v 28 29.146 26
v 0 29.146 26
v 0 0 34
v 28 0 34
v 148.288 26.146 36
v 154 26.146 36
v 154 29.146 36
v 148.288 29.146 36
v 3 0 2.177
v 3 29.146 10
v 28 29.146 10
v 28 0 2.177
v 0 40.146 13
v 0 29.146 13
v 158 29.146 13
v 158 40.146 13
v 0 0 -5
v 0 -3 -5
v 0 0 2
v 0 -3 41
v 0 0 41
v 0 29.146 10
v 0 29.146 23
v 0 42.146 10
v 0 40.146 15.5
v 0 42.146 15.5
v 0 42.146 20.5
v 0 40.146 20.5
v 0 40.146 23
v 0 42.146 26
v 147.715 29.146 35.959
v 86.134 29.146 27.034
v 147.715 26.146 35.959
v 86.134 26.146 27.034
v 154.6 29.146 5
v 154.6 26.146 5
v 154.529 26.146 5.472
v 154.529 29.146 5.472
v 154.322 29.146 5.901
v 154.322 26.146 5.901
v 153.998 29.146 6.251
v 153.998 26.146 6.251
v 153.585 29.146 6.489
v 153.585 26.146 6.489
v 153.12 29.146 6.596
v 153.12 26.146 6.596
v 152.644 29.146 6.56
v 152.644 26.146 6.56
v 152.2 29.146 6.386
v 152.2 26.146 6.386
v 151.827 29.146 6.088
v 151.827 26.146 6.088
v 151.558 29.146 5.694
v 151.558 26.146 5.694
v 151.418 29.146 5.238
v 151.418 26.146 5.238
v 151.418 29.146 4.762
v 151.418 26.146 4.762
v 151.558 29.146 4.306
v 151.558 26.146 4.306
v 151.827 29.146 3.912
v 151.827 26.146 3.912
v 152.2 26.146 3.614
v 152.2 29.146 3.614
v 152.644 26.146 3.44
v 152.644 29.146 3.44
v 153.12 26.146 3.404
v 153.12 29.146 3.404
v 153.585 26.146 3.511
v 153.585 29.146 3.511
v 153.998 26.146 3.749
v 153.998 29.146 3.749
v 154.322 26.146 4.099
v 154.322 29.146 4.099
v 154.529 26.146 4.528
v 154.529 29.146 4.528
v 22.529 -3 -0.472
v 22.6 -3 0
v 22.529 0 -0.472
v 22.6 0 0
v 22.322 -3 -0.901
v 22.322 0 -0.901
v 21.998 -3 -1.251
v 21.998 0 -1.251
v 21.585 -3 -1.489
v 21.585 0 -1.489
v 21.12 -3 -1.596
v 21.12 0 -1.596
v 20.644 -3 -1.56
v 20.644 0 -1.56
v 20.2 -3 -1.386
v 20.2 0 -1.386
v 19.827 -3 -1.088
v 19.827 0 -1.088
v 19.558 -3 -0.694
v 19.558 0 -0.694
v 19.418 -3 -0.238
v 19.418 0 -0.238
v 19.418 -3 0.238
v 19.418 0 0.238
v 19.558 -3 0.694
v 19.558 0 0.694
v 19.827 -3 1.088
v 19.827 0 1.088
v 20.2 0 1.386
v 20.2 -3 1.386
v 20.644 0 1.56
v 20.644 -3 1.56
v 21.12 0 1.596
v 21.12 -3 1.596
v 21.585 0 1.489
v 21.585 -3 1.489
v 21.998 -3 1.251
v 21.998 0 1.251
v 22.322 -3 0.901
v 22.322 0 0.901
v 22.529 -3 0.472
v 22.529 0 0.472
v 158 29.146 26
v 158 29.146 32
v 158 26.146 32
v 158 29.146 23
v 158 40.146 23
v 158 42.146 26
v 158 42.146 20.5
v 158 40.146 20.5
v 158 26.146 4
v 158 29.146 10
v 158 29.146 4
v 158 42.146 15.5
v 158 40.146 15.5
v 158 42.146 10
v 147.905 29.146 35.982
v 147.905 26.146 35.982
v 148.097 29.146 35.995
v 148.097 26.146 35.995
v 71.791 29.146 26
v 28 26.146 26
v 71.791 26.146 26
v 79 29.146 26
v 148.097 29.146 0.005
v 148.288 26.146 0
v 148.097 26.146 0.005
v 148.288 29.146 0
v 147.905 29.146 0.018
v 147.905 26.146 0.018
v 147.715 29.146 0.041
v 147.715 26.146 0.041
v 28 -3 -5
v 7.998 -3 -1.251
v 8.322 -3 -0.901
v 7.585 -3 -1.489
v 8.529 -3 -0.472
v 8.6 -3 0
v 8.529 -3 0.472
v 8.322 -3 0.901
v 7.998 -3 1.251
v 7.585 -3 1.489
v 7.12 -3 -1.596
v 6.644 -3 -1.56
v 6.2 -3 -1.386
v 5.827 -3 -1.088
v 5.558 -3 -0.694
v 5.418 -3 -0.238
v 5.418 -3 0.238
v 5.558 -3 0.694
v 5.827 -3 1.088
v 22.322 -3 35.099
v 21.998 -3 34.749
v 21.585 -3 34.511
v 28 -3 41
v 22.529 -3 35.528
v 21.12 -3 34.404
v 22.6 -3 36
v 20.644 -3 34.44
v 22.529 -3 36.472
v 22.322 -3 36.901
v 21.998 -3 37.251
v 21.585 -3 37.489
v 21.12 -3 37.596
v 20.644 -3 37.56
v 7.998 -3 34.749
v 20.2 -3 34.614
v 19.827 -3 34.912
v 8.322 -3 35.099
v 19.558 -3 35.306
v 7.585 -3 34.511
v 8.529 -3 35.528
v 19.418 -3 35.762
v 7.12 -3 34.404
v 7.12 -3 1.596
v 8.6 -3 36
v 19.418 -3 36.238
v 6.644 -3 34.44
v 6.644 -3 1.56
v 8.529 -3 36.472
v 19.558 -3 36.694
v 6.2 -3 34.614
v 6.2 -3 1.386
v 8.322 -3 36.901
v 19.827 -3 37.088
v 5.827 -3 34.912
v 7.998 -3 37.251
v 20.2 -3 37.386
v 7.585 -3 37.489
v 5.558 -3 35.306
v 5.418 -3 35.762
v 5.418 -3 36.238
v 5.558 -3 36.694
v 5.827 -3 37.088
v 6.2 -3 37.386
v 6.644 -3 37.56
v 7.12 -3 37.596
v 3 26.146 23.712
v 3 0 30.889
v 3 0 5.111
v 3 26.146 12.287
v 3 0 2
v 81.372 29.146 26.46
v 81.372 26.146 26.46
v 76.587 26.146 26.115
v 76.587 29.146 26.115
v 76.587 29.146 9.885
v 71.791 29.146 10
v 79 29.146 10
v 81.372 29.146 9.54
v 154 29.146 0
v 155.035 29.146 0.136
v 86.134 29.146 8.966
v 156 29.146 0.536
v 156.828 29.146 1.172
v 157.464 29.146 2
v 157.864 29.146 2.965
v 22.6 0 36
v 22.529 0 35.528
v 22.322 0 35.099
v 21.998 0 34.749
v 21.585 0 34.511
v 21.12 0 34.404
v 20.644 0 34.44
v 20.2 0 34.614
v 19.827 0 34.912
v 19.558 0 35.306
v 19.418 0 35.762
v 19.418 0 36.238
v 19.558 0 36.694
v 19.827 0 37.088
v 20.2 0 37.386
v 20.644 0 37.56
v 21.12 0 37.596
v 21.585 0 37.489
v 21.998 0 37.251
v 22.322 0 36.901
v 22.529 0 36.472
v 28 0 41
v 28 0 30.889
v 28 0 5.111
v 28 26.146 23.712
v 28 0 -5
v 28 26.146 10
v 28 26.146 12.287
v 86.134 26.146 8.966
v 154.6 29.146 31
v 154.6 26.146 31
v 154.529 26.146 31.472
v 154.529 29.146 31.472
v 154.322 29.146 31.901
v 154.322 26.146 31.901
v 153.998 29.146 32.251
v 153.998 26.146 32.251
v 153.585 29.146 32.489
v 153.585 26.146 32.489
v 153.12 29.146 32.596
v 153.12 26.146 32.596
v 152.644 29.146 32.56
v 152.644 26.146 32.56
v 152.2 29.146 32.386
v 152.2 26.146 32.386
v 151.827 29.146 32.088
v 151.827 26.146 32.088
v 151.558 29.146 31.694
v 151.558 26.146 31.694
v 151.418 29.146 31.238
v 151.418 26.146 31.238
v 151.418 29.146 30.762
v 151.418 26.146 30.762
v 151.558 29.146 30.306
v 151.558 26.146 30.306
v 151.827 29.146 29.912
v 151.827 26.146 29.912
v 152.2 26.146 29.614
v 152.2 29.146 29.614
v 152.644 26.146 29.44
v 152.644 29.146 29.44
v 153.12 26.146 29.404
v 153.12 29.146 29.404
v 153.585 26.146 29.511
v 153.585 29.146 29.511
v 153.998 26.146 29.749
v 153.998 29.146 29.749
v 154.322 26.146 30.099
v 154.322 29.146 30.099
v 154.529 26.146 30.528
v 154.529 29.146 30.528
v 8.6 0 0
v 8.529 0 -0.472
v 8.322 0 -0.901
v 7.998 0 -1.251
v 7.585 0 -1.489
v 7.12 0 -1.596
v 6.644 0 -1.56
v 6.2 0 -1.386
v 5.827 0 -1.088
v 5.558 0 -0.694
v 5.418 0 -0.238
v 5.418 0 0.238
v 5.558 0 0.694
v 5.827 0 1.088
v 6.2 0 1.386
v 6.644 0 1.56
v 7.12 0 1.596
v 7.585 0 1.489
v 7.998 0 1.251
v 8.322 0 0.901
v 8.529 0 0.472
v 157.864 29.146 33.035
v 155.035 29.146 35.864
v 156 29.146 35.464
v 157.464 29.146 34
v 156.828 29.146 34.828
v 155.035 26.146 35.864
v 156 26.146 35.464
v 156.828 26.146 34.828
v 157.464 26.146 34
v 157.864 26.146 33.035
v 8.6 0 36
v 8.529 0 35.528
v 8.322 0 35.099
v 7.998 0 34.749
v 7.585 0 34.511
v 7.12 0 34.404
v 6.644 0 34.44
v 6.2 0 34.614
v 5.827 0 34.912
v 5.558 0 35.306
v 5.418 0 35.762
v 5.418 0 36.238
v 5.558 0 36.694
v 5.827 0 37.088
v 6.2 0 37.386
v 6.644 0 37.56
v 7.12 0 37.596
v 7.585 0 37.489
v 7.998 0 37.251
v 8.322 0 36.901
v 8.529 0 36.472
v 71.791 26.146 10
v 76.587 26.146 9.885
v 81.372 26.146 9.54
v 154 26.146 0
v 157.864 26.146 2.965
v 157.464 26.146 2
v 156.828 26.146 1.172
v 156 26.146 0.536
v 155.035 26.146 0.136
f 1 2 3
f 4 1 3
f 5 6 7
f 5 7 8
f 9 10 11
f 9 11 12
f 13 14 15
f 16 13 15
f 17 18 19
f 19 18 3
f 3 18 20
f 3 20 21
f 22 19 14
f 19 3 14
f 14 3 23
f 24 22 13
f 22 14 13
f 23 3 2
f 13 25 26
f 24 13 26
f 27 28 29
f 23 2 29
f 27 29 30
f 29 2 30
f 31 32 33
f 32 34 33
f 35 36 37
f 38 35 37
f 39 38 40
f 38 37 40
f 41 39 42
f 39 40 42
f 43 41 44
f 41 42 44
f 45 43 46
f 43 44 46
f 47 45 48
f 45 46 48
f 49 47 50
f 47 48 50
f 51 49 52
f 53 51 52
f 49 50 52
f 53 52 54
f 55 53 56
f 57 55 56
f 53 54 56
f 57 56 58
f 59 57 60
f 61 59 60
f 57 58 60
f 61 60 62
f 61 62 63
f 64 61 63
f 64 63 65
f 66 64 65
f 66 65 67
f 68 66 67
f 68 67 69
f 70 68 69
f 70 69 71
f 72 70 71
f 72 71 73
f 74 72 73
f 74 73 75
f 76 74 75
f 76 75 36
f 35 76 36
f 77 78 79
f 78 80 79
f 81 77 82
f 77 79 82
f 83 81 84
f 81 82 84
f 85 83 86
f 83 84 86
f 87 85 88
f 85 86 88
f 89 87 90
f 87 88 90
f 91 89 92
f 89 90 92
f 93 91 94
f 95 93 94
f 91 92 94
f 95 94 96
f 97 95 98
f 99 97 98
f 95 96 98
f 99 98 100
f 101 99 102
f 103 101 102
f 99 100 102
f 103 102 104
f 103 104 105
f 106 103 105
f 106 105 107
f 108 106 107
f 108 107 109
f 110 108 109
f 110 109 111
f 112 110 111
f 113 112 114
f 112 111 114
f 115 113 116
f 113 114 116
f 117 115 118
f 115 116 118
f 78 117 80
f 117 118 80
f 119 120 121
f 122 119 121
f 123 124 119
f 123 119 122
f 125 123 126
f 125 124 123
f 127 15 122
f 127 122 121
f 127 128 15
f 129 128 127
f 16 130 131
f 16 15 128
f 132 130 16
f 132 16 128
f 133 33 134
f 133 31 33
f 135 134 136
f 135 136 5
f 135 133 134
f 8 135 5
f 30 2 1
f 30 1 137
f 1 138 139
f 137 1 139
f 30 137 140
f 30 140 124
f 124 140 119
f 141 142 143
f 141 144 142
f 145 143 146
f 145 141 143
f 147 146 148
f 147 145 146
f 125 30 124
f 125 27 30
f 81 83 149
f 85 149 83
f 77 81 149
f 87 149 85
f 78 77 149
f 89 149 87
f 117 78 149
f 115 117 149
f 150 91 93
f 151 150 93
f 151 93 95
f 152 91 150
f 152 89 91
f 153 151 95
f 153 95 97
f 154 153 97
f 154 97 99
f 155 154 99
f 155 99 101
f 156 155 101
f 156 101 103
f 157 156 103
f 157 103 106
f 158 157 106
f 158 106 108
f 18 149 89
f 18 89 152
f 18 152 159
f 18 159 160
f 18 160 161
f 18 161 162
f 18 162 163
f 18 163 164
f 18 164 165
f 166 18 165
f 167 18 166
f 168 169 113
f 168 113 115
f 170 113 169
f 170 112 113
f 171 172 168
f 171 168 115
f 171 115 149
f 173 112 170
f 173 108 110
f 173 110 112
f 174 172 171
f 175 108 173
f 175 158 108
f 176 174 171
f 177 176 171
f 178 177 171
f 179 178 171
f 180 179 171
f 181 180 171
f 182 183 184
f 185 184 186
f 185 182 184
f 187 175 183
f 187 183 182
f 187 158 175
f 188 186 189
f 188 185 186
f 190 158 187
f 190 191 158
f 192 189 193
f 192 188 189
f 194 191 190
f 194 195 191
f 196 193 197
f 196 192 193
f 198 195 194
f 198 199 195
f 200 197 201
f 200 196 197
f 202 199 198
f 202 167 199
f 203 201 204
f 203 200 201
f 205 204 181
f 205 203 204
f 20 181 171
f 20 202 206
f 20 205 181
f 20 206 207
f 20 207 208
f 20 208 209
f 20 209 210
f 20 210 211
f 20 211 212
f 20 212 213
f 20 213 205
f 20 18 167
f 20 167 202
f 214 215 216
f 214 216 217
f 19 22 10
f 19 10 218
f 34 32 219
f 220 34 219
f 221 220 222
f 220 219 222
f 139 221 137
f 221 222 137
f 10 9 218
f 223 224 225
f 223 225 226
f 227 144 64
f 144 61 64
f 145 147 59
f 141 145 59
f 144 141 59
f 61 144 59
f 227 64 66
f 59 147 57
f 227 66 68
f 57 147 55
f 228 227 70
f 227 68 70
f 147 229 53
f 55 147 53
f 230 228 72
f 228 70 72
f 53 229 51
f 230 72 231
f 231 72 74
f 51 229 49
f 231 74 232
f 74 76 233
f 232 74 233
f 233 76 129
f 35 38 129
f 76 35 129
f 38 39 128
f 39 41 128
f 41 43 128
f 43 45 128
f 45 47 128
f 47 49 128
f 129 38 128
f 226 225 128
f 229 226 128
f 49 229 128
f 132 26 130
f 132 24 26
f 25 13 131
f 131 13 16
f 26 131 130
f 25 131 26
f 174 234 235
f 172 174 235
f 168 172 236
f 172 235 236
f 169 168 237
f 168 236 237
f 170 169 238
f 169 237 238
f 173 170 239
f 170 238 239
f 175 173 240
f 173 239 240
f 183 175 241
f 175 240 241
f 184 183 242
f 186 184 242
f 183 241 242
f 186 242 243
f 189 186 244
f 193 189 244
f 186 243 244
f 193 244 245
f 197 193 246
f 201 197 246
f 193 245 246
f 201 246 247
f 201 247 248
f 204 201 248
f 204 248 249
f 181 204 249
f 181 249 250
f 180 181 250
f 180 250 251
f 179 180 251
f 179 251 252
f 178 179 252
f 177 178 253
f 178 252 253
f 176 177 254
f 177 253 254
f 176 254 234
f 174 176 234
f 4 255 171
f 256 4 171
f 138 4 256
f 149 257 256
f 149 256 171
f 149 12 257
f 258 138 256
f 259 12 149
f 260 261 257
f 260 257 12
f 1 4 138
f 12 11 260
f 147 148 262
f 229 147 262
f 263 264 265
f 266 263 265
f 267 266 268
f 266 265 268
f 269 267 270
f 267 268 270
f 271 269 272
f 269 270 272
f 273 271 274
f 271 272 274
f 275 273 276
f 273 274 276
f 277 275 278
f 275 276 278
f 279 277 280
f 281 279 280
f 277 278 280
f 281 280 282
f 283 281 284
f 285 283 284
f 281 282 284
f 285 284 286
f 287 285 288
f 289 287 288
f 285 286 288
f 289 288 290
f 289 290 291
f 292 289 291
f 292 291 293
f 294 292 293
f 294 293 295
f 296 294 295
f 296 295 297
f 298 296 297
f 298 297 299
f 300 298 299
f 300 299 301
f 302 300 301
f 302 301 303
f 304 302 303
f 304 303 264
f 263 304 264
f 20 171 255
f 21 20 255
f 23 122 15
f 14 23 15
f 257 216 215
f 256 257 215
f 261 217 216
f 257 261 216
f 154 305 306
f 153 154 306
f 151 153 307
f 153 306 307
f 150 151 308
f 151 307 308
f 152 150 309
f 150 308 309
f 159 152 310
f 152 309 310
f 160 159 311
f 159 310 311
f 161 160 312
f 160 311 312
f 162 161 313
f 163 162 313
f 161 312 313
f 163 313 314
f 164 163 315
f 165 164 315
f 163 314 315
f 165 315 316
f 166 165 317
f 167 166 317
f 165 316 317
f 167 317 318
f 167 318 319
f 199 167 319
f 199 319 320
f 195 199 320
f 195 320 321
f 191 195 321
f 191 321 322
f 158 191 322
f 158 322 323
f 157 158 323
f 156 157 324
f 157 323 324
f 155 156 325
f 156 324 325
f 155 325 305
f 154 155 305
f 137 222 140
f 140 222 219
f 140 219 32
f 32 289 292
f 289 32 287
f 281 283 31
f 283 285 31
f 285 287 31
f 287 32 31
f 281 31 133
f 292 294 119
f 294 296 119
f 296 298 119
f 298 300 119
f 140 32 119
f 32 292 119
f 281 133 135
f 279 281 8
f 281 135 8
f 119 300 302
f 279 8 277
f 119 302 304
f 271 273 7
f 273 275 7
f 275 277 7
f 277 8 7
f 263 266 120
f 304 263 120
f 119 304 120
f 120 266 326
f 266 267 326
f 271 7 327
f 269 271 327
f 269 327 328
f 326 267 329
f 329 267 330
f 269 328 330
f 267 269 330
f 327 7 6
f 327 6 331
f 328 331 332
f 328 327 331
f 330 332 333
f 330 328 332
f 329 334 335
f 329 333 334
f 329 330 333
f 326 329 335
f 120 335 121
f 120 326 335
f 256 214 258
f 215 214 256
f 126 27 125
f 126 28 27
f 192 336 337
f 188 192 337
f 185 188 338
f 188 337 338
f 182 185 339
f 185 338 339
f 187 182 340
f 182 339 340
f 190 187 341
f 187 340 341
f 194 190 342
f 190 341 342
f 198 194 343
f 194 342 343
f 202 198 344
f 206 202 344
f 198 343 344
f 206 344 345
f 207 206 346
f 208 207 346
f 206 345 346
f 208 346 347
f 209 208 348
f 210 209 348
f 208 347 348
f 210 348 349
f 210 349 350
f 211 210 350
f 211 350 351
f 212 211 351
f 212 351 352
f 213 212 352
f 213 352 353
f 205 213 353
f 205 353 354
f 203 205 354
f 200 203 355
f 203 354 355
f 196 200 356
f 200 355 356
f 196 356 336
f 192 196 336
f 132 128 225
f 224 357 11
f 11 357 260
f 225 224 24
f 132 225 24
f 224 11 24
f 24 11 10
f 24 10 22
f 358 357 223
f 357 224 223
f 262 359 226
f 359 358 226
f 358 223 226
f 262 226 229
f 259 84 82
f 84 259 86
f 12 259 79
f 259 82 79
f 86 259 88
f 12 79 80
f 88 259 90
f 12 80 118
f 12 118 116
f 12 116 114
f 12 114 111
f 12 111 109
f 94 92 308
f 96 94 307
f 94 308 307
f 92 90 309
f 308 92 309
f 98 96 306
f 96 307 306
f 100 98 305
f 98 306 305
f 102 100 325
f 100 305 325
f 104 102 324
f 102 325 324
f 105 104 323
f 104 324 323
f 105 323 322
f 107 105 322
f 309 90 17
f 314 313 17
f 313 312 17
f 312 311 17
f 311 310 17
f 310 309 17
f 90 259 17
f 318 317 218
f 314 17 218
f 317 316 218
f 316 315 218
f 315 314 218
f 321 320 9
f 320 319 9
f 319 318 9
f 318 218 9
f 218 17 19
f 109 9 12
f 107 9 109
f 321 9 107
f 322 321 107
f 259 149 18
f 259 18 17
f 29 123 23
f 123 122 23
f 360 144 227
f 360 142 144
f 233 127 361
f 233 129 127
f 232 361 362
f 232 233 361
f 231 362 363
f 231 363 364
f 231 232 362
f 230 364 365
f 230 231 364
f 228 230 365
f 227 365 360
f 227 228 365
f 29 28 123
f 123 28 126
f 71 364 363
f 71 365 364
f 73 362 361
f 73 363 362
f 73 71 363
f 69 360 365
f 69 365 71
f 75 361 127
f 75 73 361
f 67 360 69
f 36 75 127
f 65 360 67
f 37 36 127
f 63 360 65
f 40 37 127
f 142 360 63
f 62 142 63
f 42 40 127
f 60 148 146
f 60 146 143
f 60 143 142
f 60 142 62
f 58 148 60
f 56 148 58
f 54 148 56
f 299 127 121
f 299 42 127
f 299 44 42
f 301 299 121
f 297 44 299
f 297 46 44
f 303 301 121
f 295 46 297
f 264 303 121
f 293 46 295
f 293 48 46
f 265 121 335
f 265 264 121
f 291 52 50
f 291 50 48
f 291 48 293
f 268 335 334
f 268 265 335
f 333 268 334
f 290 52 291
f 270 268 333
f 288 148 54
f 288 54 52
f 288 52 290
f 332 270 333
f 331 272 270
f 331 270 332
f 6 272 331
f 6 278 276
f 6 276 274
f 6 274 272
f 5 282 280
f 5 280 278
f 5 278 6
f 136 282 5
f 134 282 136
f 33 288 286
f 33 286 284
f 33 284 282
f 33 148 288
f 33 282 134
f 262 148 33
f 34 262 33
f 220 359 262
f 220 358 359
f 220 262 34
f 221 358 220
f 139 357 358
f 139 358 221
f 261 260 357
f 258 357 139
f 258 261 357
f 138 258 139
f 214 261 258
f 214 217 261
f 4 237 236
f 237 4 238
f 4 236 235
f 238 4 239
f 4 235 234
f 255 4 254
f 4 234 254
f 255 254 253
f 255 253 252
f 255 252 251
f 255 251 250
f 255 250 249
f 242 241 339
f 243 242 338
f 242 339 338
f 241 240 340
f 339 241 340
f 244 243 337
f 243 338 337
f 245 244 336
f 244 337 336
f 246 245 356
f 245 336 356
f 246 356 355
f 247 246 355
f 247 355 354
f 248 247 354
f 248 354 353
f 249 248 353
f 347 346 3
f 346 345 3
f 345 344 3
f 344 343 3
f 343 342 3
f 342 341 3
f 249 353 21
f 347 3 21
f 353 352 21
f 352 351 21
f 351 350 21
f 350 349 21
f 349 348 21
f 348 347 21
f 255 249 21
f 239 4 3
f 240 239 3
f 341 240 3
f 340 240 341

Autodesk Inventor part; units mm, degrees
ref_plane "YZ Plane" through (0, 0, 0) normal (1, 0, 0) x (0, 1, 0)
ref_plane "XZ Plane" through (0, 0, 0) normal (0, 1, 0) x (-1, 0, 0)
ref_plane "XY Plane" through (0, 0, 0) normal (0, 0, 1) x (1, 0, 0)
sketch "Эскиз2" plane through (0, 0, 0) normal (1, 0, 0) x (0, 1, 0)
  line L0 (0, 0) -> (-3, 0)
  line L1 (-3, 0) -> (-3, 36)
  line L2 (-3, 36) -> (0, 36)
  line L3 (0, 36) -> (0, 0)
  line L4 (-3, 0) -> (0, 0)
  line L5 (0, 0) -> (0, -5)
  line L6 (0, -5) -> (-3, -5)
  line L7 (-3, -5) -> (-3, 0)
  line L8 (-3, 36) -> (0, 36)
  line L9 (0, 36) -> (0, 41)
  line L10 (0, 41) -> (-3, 41)
  line L11 (-3, 41) -> (-3, 36)
  line L12 (0, 0) -> (0, 36)
  line L13 (0, 36) -> (0, 34)
  line L14 (0, 0) -> (0, 2)
  line L15 (29.146, 18) -> (29.146, 26)
  line L16 (29.146, 26) -> (29.146, 10)
  line L17 (29.146, 10) -> (0, 2)
  line L18 (29.146, 26) -> (0, 34)
  point P0 (19.146, 0)
  dimension "d4" = 3
  dimension "d5" = 36
  dimension "d6" = 5
  dimension "d7" = 5
  dimension "d8" = 19.146
  dimension "d13" = 2
  dimension "d14" = 2
extrude "Выдавливание2" add sketch "Эскиз2" along normal blind 3
sketch "Эскиз3" plane through (3, 0, 0) normal (1, 0, 0) x (0, 0, -1)
  line L0 (5, -3) -> (5, 0) projected
  line L1 (5, 0) -> (-41, 0) projected
  line L2 (5, -3) -> (-41, -3)
  line L3 (-41, -3) -> (-41, 0)
  line L4 (-41, 0) -> (5, 0)
  line L5 (5, 0) -> (5, -3)
  point P0 (0, 0)
  point P1 (-34, 0)
extrude "Выдавливание3" add sketch "Эскиз3" along normal blind 25
sketch "Эскиз5" plane through (0, 0, 2) normal (0, 1, 0) x (1, 0, 0)
  line L0 (0, 7) -> (28, 7) projected
  line L1 (0, 7) -> (0, 2)
  line L2 (0, 7) -> (0, 0) projected
  line L3 (0, 2) -> (28, 2)
  line L4 (28, -39) -> (28, 7) projected
  line L5 (0, 7) -> (0, -39) projected
  line L6 (0, -39) -> (0, -34)
  line L7 (0, -34) -> (28, -34)
  line L8 (28, -34) -> (21, -34)
  line L9 (21, -34) -> (7, -34)
  line L10 (7, -34) -> (7, 2)
  circle A0 centre (7, -34) radius 1.6
  circle A1 centre (21, -34) radius 1.6
  circle A2 centre (7, 2) radius 1.6
  circle A3 centre (21, 2) radius 1.6
  point P0 (0, -32)
  dimension "d17" = 5
  dimension "d18" = 7
  dimension "d19" = 14
  dimension "d20" = 3.2
  dimension "d21" = 3.2
  dimension "d22" = 3.2
  dimension "d23" = 3.2
extrude "Выдавливание4" cut sketch "Эскиз5" against normal blind 25 contours A2 L3 | L3 L10 A2 | A3 L3 | L3 A3 | L3 A2 L10 | A1 L7 | L7 A1 | A0 L10 L7 | L7 A0 | A0 L7 L10
sketch "Эскиз7" plane through (3, 0, 0) normal (1, 0, 0) x (0, 0, -1)
  line L0 (-10, 29.146) -> (-26, 29.146) projected
  line L1 (-26, 29.146) -> (-10, 29.146)
  line L2 (-10, 29.146) -> (-10, 26.146)
  line L3 (-10, 26.146) -> (-26, 26.146)
  line L4 (-26, 26.146) -> (-26, 29.146)
  point P0 (0, 0)
  dimension "d37" = 3
extrude "Выдавливание6" add sketch "Эскиз7" along normal blind 155 and the other way blind 3
sketch "Эскиз8" plane through (0, 29.146, 26) normal (0, 1, 0) x (1, 0, 0)
  line L0 (158, 16) -> (158, 0) projected
  line L1 (0, -15) -> (0, 31) projected
  line L2 (158, 16) -> (0, 16)
  line L3 (0, 16) -> (0, 13)
  line L4 (0, 13) -> (158, 13)
  line L5 (158, 13) -> (158, 16)
  line L6 (0, 0) -> (3, 0) projected
  line L7 (0, 0) -> (158, 0)
  line L8 (158, 0) -> (158, 3)
  line L9 (158, 3) -> (0, 3)
  line L10 (0, 3) -> (0, 0)
  point P0 (0, 26)
  point P1 (158, 3)
  point P2 (0, 3)
  dimension "d38" = 3
  dimension "d39" = 3
extrude "Выдавливание7" add sketch "Эскиз8" along normal blind 11 contours L0 L4 L1 L2 | L0 L7 L6 L1 L9
sketch "Эскиз9" plane through (3, 0, 0) normal (1, 0, 0) x (0, 0, -1)
  line L0 (-26, 29.146) -> (-34, 0) projected
  line L1 (-34, 0) -> (-26, 29.146)
  line L2 (-26, 29.146) -> (-10, 29.146)
  line L3 (-10, 29.146) -> (-2.177, 0)
  line L4 (-2.177, 0) -> (-34, 0)
  line L5 (-1.6, 0) -> (1.6, 0) projected
  line L6 (-26, 29.146) -> (-23.107, 28.3519)
  line L7 (-23.107, 28.3519) -> (-30.889, 0)
  line L8 (-2, 0) -> (-10, 29.146) projected
  line L9 (-2, 0) -> (-5.111, 0)
  line L10 (-34, 0) -> (-2, 0) projected
  line L11 (-10, 29.146) -> (-12.8975, 28.3685)
  line L12 (-10, 29.146) -> (-7, 29.146) construction
  line L13 (-12.8975, 28.3685) -> (-5.111, 0)
  point P0 (0, 0)
  dimension "d42" = 3
  dimension "d43" = 3.111
  dimension "d44" = 3
  dimension "d45" = 164.98
extrude "Выдавливание8" add sketch "Эскиз9" along normal blind 25 contours L6 L7 L4 L0 | L3 L4 L13 L11
sketch "Эскиз10" plane through (0, 40.146, 26) normal (0, 1, 0) x (1, 0, 0)
  line L0 (0, 0) -> (0, -8) projected
  line L1 (158, 16) -> (28, 16) projected
  line L2 (0, 0) -> (158, 0)
  line L3 (158, 0) -> (158, 16)
  line L4 (158, 16) -> (0, 16)
  line L5 (0, 16) -> (0, 0)
  line L6 (0, -15) -> (0, 31) projected
  line L7 (0, 8) -> (0, 10.5)
  line L8 (0, 10.5) -> (0, 5.5)
  line L9 (0, 5.5) -> (158, 5.5)
  line L10 (158, 13) -> (158, 3) projected
  line L11 (158, 5.5) -> (158, 10.5)
  line L12 (158, 10.5) -> (0, 10.5)
  line L13 (0, 13) -> (158, 13) projected
  point P0 (0, 26)
  point P1 (28, 16)
  dimension "d48" = 2.5
  dimension "d49" = 5
extrude "Выдавливание9" add sketch "Эскиз10" along normal blind 2 contours L3 L13 L5 L4 L1 | L3 L12 L5 L13 | L3 L2 L5 L9
sketch "Эскиз11" plane through (28, 26.146, 10) normal (0, -1, 0) x (1, 0, 0)
  line L0 (130, 0) -> (-28, 0) projected
  line L1 (130, 0) -> (130, -10)
  line L2 (125, -5) -> (125, 21)
  line L3 (130, 16) -> (130, 10.5) projected
  line L4 (130, 21) -> (130, 16)
  line L5 (130, 16) -> (130, 21)
  line L6 (130, 21) -> (130, 26)
  line L7 (130, 26) -> (120, 26)
  line L8 (120, 26) -> (120, -10)
  line L9 (120, -10) -> (130, -10)
  line L10 (-28, 16) -> (130, 16) projected
  line L11 (51, 16) -> (120, 26)
  line L12 (120, -10) -> (51, 0)
  circle A0 centre (125, 21) radius 1.6
  circle A1 centre (125, -5) radius 1.6
  point P0 (-28, -10)
  dimension "d52" = 10
  dimension "d54" = 26
  dimension "d56" = 10
  dimension "d57" = 3.2
  dimension "d58" = 3.2
extrude "Выдавливание10" add sketch "Эскиз11" against normal blind 3 contours L1 L9 L8 L0 | L8 L12 L0 | L10 L8 L7 L6 L4 | L10 L11 L8
fillet "Сопряжение1" radius 4 4 edges at (158, 27.646, 36) (158, 27.646, 0) (148, 27.646, 0) (148, 27.646, 36)
fillet "Сопряжение2" radius 100 2 edges at (79, 27.646, 10) (79, 27.646, 26)
properties part number "reyka"
